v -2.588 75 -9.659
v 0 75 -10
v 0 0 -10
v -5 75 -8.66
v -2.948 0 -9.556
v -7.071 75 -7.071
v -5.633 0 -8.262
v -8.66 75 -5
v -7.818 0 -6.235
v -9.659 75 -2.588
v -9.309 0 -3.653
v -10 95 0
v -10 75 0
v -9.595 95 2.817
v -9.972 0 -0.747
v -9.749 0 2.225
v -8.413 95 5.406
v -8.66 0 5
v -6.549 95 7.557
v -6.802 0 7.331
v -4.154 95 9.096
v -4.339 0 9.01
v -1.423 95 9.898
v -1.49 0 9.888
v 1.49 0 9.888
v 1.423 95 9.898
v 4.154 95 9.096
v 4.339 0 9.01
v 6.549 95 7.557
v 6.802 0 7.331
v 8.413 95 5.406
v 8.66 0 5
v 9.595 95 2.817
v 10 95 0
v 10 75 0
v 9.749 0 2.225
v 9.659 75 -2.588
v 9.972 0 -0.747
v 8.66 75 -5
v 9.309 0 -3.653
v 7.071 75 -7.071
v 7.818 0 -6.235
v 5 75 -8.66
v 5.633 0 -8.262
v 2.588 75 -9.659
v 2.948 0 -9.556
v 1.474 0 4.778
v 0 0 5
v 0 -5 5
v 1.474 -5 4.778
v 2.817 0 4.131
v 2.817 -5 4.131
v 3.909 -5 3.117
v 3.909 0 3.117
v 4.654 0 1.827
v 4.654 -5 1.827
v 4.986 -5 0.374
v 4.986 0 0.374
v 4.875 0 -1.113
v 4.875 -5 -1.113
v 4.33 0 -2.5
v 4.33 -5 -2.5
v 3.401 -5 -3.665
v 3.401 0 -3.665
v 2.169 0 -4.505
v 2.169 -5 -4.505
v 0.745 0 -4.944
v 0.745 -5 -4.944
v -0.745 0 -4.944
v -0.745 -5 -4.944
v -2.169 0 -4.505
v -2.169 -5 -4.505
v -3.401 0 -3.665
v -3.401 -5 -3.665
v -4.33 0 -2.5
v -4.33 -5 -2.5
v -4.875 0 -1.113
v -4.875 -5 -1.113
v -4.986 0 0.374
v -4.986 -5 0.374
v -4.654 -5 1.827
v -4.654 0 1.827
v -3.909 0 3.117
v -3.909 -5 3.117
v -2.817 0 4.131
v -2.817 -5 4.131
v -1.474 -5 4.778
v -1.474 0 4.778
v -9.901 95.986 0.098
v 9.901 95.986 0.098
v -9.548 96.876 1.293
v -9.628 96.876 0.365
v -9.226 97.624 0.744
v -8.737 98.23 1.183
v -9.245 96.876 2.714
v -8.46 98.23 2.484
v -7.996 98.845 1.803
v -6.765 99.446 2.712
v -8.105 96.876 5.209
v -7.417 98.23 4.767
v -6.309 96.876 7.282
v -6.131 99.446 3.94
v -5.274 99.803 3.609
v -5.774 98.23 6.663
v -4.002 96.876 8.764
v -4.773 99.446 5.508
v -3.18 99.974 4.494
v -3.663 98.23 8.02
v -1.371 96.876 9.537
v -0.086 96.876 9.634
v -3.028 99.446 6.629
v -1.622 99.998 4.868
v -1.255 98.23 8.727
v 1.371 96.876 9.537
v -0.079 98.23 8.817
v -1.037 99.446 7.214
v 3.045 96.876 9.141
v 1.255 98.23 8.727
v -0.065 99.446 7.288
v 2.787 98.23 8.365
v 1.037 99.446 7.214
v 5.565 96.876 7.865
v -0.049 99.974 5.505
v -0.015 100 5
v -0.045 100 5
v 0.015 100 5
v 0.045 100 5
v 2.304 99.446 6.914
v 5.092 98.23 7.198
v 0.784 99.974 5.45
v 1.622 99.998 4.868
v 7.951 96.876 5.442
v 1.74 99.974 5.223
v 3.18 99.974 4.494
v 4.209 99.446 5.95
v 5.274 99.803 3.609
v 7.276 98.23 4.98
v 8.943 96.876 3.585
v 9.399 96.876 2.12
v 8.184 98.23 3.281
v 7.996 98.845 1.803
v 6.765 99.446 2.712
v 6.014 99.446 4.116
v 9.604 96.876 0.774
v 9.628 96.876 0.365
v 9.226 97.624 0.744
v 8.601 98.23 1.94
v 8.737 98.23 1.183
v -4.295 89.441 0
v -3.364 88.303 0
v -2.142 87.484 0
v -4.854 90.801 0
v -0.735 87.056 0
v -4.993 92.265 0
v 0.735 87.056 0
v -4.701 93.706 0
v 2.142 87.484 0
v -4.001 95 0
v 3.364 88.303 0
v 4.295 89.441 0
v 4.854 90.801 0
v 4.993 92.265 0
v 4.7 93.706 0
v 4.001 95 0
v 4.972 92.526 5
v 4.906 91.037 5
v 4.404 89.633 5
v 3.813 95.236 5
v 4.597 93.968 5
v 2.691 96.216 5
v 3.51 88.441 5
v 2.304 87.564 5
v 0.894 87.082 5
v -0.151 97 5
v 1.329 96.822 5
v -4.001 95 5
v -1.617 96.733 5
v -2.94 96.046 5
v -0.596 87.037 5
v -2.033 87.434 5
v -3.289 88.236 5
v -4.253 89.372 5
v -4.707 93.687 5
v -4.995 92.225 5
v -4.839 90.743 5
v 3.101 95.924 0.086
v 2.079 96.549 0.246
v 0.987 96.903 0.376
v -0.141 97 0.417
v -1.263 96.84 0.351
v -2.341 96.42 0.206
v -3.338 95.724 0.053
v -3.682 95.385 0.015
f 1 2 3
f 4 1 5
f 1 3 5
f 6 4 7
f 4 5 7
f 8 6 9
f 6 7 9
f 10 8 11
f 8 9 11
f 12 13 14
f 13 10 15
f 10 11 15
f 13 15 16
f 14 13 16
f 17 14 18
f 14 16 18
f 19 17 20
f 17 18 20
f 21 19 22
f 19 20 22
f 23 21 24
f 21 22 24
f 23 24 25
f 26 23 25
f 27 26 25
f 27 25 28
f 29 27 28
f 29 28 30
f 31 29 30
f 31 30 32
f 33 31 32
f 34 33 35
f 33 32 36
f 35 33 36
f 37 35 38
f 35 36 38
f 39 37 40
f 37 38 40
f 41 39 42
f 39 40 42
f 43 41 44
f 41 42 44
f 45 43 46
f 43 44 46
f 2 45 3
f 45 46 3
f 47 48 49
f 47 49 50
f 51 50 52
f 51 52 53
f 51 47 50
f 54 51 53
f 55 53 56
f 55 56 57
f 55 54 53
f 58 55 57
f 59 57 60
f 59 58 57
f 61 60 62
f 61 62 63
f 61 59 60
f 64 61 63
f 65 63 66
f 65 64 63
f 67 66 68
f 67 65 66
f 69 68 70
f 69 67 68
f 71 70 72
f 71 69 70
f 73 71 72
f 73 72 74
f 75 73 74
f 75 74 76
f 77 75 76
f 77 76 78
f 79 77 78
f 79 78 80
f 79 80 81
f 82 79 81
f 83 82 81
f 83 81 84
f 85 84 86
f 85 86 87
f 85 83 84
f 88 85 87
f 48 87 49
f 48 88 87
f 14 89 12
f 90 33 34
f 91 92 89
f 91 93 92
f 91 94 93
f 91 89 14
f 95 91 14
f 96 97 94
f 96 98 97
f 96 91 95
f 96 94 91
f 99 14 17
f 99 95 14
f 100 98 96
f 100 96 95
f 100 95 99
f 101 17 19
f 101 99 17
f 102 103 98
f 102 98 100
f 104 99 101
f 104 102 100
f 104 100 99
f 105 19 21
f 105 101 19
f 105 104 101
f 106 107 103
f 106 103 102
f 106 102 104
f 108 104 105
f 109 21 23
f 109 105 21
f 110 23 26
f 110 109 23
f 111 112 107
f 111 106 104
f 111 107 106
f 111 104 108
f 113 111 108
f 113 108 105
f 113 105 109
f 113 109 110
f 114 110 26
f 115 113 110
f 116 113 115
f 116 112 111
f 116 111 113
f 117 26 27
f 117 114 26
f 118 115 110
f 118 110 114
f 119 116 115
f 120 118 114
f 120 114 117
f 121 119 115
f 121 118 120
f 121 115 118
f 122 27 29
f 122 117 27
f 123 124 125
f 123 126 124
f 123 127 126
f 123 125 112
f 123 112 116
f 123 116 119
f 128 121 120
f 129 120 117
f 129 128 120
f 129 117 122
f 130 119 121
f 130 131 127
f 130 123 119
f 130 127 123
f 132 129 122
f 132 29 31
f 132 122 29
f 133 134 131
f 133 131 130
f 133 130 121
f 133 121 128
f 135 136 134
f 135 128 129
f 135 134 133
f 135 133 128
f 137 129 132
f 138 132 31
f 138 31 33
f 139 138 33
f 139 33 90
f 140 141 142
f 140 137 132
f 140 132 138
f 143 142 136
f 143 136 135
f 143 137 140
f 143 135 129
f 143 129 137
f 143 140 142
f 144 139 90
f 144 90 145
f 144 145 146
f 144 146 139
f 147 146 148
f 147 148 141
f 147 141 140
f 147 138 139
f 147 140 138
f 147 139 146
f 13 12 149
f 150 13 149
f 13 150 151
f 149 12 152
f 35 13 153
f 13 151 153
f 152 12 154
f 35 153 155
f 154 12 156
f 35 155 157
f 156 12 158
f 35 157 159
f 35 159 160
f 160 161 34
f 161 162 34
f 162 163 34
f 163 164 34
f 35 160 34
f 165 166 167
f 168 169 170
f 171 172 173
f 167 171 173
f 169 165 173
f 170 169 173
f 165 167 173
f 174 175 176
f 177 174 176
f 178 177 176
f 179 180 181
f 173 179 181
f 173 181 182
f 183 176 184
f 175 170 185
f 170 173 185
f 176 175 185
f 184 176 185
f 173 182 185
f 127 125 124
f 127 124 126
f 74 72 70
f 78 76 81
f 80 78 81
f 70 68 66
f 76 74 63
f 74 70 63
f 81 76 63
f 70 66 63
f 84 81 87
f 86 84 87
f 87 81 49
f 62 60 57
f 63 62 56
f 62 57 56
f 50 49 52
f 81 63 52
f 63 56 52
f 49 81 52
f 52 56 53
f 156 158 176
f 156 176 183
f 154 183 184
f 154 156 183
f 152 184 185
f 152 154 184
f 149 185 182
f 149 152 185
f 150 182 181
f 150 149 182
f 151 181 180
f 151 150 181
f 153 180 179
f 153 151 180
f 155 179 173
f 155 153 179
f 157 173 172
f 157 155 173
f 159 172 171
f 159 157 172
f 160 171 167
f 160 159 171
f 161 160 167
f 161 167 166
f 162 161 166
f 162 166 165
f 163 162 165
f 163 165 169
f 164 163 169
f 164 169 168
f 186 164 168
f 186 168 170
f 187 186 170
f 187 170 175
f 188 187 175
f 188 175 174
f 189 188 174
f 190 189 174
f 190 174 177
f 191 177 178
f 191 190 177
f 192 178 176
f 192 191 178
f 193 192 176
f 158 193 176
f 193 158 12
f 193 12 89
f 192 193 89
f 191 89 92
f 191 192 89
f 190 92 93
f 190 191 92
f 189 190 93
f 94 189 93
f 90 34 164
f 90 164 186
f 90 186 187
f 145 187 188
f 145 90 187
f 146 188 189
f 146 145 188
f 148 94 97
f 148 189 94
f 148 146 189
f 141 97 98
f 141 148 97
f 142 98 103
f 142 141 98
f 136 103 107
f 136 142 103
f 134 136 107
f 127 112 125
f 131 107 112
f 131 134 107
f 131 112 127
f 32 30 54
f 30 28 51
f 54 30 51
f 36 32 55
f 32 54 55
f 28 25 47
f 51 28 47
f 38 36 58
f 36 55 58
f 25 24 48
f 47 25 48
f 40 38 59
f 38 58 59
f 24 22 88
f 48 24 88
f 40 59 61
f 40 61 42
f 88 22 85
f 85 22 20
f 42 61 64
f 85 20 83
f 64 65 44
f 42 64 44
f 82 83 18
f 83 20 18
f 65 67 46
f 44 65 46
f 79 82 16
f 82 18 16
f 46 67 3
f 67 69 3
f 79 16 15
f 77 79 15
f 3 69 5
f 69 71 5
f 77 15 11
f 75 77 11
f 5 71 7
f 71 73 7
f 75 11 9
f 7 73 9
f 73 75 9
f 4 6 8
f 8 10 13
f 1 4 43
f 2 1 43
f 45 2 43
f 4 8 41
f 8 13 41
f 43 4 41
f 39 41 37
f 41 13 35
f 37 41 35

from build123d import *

# Parameters (mm, degrees)
SKETCH1_R           = 10
BOSS_EXTRUDE1_DEPTH = 100
SKETCH4_W           = 20
SKETCH4_H           = 25
CUT_EXTRUDE2_DEPTH  = 10
FILLET3_R           = 5
SKETCH3_R           = 5
BOSS_EXTRUDE3_DEPTH = 5
SKETCH7_R           = 5
CUT_EXTRUDE3_DEPTH  = 5


with BuildPart() as part:
    # Sketch1 → Boss-Extrude1 (new body)
    with BuildSketch(Plane(origin=(0, 0, 0), x_dir=(1, 0, 0), z_dir=(0, 1, 0))):
        with Locations(Location((0, 0, 0), (0, 0, 90))):
            Circle(SKETCH1_R)
    extrude(amount=BOSS_EXTRUDE1_DEPTH)

    # Sketch4 → Cut-Extrude2 (cut)
    with BuildSketch(Plane.XY):
        with Locations((0, 87.5)):
            Rectangle(SKETCH4_W, SKETCH4_H)
    extrude(amount=-CUT_EXTRUDE2_DEPTH, mode=Mode.SUBTRACT)

    # Fillet3
    fillet3_edges = [part.edges().sort_by_distance(p)[0] for p in [
        (0, 100, 0),
        (0, 100, 10),
    ]]
    fillet(fillet3_edges, radius=FILLET3_R - 0.0001)  # a hair under: the kernel refuses the full size

    # Sketch3 → Boss-Extrude3 (add)
    with BuildSketch(Plane(origin=(0, 0, 0), x_dir=(1, 0, 0), z_dir=(0, 1, 0))):
        with Locations(Location((0, 0, 0), (0, 0, 270))):
            Circle(SKETCH3_R)
    extrude(amount=-BOSS_EXTRUDE3_DEPTH)

    # Sketch7 → Cut-Extrude3 (cut)
    with BuildSketch(Plane.XY):
        with Locations(Location((0, 92.001790993, 0), (0, 0, 143.155752141))):
            Circle(SKETCH7_R)
    extrude(amount=CUT_EXTRUDE3_DEPTH, mode=Mode.SUBTRACT)


solid = part.part
